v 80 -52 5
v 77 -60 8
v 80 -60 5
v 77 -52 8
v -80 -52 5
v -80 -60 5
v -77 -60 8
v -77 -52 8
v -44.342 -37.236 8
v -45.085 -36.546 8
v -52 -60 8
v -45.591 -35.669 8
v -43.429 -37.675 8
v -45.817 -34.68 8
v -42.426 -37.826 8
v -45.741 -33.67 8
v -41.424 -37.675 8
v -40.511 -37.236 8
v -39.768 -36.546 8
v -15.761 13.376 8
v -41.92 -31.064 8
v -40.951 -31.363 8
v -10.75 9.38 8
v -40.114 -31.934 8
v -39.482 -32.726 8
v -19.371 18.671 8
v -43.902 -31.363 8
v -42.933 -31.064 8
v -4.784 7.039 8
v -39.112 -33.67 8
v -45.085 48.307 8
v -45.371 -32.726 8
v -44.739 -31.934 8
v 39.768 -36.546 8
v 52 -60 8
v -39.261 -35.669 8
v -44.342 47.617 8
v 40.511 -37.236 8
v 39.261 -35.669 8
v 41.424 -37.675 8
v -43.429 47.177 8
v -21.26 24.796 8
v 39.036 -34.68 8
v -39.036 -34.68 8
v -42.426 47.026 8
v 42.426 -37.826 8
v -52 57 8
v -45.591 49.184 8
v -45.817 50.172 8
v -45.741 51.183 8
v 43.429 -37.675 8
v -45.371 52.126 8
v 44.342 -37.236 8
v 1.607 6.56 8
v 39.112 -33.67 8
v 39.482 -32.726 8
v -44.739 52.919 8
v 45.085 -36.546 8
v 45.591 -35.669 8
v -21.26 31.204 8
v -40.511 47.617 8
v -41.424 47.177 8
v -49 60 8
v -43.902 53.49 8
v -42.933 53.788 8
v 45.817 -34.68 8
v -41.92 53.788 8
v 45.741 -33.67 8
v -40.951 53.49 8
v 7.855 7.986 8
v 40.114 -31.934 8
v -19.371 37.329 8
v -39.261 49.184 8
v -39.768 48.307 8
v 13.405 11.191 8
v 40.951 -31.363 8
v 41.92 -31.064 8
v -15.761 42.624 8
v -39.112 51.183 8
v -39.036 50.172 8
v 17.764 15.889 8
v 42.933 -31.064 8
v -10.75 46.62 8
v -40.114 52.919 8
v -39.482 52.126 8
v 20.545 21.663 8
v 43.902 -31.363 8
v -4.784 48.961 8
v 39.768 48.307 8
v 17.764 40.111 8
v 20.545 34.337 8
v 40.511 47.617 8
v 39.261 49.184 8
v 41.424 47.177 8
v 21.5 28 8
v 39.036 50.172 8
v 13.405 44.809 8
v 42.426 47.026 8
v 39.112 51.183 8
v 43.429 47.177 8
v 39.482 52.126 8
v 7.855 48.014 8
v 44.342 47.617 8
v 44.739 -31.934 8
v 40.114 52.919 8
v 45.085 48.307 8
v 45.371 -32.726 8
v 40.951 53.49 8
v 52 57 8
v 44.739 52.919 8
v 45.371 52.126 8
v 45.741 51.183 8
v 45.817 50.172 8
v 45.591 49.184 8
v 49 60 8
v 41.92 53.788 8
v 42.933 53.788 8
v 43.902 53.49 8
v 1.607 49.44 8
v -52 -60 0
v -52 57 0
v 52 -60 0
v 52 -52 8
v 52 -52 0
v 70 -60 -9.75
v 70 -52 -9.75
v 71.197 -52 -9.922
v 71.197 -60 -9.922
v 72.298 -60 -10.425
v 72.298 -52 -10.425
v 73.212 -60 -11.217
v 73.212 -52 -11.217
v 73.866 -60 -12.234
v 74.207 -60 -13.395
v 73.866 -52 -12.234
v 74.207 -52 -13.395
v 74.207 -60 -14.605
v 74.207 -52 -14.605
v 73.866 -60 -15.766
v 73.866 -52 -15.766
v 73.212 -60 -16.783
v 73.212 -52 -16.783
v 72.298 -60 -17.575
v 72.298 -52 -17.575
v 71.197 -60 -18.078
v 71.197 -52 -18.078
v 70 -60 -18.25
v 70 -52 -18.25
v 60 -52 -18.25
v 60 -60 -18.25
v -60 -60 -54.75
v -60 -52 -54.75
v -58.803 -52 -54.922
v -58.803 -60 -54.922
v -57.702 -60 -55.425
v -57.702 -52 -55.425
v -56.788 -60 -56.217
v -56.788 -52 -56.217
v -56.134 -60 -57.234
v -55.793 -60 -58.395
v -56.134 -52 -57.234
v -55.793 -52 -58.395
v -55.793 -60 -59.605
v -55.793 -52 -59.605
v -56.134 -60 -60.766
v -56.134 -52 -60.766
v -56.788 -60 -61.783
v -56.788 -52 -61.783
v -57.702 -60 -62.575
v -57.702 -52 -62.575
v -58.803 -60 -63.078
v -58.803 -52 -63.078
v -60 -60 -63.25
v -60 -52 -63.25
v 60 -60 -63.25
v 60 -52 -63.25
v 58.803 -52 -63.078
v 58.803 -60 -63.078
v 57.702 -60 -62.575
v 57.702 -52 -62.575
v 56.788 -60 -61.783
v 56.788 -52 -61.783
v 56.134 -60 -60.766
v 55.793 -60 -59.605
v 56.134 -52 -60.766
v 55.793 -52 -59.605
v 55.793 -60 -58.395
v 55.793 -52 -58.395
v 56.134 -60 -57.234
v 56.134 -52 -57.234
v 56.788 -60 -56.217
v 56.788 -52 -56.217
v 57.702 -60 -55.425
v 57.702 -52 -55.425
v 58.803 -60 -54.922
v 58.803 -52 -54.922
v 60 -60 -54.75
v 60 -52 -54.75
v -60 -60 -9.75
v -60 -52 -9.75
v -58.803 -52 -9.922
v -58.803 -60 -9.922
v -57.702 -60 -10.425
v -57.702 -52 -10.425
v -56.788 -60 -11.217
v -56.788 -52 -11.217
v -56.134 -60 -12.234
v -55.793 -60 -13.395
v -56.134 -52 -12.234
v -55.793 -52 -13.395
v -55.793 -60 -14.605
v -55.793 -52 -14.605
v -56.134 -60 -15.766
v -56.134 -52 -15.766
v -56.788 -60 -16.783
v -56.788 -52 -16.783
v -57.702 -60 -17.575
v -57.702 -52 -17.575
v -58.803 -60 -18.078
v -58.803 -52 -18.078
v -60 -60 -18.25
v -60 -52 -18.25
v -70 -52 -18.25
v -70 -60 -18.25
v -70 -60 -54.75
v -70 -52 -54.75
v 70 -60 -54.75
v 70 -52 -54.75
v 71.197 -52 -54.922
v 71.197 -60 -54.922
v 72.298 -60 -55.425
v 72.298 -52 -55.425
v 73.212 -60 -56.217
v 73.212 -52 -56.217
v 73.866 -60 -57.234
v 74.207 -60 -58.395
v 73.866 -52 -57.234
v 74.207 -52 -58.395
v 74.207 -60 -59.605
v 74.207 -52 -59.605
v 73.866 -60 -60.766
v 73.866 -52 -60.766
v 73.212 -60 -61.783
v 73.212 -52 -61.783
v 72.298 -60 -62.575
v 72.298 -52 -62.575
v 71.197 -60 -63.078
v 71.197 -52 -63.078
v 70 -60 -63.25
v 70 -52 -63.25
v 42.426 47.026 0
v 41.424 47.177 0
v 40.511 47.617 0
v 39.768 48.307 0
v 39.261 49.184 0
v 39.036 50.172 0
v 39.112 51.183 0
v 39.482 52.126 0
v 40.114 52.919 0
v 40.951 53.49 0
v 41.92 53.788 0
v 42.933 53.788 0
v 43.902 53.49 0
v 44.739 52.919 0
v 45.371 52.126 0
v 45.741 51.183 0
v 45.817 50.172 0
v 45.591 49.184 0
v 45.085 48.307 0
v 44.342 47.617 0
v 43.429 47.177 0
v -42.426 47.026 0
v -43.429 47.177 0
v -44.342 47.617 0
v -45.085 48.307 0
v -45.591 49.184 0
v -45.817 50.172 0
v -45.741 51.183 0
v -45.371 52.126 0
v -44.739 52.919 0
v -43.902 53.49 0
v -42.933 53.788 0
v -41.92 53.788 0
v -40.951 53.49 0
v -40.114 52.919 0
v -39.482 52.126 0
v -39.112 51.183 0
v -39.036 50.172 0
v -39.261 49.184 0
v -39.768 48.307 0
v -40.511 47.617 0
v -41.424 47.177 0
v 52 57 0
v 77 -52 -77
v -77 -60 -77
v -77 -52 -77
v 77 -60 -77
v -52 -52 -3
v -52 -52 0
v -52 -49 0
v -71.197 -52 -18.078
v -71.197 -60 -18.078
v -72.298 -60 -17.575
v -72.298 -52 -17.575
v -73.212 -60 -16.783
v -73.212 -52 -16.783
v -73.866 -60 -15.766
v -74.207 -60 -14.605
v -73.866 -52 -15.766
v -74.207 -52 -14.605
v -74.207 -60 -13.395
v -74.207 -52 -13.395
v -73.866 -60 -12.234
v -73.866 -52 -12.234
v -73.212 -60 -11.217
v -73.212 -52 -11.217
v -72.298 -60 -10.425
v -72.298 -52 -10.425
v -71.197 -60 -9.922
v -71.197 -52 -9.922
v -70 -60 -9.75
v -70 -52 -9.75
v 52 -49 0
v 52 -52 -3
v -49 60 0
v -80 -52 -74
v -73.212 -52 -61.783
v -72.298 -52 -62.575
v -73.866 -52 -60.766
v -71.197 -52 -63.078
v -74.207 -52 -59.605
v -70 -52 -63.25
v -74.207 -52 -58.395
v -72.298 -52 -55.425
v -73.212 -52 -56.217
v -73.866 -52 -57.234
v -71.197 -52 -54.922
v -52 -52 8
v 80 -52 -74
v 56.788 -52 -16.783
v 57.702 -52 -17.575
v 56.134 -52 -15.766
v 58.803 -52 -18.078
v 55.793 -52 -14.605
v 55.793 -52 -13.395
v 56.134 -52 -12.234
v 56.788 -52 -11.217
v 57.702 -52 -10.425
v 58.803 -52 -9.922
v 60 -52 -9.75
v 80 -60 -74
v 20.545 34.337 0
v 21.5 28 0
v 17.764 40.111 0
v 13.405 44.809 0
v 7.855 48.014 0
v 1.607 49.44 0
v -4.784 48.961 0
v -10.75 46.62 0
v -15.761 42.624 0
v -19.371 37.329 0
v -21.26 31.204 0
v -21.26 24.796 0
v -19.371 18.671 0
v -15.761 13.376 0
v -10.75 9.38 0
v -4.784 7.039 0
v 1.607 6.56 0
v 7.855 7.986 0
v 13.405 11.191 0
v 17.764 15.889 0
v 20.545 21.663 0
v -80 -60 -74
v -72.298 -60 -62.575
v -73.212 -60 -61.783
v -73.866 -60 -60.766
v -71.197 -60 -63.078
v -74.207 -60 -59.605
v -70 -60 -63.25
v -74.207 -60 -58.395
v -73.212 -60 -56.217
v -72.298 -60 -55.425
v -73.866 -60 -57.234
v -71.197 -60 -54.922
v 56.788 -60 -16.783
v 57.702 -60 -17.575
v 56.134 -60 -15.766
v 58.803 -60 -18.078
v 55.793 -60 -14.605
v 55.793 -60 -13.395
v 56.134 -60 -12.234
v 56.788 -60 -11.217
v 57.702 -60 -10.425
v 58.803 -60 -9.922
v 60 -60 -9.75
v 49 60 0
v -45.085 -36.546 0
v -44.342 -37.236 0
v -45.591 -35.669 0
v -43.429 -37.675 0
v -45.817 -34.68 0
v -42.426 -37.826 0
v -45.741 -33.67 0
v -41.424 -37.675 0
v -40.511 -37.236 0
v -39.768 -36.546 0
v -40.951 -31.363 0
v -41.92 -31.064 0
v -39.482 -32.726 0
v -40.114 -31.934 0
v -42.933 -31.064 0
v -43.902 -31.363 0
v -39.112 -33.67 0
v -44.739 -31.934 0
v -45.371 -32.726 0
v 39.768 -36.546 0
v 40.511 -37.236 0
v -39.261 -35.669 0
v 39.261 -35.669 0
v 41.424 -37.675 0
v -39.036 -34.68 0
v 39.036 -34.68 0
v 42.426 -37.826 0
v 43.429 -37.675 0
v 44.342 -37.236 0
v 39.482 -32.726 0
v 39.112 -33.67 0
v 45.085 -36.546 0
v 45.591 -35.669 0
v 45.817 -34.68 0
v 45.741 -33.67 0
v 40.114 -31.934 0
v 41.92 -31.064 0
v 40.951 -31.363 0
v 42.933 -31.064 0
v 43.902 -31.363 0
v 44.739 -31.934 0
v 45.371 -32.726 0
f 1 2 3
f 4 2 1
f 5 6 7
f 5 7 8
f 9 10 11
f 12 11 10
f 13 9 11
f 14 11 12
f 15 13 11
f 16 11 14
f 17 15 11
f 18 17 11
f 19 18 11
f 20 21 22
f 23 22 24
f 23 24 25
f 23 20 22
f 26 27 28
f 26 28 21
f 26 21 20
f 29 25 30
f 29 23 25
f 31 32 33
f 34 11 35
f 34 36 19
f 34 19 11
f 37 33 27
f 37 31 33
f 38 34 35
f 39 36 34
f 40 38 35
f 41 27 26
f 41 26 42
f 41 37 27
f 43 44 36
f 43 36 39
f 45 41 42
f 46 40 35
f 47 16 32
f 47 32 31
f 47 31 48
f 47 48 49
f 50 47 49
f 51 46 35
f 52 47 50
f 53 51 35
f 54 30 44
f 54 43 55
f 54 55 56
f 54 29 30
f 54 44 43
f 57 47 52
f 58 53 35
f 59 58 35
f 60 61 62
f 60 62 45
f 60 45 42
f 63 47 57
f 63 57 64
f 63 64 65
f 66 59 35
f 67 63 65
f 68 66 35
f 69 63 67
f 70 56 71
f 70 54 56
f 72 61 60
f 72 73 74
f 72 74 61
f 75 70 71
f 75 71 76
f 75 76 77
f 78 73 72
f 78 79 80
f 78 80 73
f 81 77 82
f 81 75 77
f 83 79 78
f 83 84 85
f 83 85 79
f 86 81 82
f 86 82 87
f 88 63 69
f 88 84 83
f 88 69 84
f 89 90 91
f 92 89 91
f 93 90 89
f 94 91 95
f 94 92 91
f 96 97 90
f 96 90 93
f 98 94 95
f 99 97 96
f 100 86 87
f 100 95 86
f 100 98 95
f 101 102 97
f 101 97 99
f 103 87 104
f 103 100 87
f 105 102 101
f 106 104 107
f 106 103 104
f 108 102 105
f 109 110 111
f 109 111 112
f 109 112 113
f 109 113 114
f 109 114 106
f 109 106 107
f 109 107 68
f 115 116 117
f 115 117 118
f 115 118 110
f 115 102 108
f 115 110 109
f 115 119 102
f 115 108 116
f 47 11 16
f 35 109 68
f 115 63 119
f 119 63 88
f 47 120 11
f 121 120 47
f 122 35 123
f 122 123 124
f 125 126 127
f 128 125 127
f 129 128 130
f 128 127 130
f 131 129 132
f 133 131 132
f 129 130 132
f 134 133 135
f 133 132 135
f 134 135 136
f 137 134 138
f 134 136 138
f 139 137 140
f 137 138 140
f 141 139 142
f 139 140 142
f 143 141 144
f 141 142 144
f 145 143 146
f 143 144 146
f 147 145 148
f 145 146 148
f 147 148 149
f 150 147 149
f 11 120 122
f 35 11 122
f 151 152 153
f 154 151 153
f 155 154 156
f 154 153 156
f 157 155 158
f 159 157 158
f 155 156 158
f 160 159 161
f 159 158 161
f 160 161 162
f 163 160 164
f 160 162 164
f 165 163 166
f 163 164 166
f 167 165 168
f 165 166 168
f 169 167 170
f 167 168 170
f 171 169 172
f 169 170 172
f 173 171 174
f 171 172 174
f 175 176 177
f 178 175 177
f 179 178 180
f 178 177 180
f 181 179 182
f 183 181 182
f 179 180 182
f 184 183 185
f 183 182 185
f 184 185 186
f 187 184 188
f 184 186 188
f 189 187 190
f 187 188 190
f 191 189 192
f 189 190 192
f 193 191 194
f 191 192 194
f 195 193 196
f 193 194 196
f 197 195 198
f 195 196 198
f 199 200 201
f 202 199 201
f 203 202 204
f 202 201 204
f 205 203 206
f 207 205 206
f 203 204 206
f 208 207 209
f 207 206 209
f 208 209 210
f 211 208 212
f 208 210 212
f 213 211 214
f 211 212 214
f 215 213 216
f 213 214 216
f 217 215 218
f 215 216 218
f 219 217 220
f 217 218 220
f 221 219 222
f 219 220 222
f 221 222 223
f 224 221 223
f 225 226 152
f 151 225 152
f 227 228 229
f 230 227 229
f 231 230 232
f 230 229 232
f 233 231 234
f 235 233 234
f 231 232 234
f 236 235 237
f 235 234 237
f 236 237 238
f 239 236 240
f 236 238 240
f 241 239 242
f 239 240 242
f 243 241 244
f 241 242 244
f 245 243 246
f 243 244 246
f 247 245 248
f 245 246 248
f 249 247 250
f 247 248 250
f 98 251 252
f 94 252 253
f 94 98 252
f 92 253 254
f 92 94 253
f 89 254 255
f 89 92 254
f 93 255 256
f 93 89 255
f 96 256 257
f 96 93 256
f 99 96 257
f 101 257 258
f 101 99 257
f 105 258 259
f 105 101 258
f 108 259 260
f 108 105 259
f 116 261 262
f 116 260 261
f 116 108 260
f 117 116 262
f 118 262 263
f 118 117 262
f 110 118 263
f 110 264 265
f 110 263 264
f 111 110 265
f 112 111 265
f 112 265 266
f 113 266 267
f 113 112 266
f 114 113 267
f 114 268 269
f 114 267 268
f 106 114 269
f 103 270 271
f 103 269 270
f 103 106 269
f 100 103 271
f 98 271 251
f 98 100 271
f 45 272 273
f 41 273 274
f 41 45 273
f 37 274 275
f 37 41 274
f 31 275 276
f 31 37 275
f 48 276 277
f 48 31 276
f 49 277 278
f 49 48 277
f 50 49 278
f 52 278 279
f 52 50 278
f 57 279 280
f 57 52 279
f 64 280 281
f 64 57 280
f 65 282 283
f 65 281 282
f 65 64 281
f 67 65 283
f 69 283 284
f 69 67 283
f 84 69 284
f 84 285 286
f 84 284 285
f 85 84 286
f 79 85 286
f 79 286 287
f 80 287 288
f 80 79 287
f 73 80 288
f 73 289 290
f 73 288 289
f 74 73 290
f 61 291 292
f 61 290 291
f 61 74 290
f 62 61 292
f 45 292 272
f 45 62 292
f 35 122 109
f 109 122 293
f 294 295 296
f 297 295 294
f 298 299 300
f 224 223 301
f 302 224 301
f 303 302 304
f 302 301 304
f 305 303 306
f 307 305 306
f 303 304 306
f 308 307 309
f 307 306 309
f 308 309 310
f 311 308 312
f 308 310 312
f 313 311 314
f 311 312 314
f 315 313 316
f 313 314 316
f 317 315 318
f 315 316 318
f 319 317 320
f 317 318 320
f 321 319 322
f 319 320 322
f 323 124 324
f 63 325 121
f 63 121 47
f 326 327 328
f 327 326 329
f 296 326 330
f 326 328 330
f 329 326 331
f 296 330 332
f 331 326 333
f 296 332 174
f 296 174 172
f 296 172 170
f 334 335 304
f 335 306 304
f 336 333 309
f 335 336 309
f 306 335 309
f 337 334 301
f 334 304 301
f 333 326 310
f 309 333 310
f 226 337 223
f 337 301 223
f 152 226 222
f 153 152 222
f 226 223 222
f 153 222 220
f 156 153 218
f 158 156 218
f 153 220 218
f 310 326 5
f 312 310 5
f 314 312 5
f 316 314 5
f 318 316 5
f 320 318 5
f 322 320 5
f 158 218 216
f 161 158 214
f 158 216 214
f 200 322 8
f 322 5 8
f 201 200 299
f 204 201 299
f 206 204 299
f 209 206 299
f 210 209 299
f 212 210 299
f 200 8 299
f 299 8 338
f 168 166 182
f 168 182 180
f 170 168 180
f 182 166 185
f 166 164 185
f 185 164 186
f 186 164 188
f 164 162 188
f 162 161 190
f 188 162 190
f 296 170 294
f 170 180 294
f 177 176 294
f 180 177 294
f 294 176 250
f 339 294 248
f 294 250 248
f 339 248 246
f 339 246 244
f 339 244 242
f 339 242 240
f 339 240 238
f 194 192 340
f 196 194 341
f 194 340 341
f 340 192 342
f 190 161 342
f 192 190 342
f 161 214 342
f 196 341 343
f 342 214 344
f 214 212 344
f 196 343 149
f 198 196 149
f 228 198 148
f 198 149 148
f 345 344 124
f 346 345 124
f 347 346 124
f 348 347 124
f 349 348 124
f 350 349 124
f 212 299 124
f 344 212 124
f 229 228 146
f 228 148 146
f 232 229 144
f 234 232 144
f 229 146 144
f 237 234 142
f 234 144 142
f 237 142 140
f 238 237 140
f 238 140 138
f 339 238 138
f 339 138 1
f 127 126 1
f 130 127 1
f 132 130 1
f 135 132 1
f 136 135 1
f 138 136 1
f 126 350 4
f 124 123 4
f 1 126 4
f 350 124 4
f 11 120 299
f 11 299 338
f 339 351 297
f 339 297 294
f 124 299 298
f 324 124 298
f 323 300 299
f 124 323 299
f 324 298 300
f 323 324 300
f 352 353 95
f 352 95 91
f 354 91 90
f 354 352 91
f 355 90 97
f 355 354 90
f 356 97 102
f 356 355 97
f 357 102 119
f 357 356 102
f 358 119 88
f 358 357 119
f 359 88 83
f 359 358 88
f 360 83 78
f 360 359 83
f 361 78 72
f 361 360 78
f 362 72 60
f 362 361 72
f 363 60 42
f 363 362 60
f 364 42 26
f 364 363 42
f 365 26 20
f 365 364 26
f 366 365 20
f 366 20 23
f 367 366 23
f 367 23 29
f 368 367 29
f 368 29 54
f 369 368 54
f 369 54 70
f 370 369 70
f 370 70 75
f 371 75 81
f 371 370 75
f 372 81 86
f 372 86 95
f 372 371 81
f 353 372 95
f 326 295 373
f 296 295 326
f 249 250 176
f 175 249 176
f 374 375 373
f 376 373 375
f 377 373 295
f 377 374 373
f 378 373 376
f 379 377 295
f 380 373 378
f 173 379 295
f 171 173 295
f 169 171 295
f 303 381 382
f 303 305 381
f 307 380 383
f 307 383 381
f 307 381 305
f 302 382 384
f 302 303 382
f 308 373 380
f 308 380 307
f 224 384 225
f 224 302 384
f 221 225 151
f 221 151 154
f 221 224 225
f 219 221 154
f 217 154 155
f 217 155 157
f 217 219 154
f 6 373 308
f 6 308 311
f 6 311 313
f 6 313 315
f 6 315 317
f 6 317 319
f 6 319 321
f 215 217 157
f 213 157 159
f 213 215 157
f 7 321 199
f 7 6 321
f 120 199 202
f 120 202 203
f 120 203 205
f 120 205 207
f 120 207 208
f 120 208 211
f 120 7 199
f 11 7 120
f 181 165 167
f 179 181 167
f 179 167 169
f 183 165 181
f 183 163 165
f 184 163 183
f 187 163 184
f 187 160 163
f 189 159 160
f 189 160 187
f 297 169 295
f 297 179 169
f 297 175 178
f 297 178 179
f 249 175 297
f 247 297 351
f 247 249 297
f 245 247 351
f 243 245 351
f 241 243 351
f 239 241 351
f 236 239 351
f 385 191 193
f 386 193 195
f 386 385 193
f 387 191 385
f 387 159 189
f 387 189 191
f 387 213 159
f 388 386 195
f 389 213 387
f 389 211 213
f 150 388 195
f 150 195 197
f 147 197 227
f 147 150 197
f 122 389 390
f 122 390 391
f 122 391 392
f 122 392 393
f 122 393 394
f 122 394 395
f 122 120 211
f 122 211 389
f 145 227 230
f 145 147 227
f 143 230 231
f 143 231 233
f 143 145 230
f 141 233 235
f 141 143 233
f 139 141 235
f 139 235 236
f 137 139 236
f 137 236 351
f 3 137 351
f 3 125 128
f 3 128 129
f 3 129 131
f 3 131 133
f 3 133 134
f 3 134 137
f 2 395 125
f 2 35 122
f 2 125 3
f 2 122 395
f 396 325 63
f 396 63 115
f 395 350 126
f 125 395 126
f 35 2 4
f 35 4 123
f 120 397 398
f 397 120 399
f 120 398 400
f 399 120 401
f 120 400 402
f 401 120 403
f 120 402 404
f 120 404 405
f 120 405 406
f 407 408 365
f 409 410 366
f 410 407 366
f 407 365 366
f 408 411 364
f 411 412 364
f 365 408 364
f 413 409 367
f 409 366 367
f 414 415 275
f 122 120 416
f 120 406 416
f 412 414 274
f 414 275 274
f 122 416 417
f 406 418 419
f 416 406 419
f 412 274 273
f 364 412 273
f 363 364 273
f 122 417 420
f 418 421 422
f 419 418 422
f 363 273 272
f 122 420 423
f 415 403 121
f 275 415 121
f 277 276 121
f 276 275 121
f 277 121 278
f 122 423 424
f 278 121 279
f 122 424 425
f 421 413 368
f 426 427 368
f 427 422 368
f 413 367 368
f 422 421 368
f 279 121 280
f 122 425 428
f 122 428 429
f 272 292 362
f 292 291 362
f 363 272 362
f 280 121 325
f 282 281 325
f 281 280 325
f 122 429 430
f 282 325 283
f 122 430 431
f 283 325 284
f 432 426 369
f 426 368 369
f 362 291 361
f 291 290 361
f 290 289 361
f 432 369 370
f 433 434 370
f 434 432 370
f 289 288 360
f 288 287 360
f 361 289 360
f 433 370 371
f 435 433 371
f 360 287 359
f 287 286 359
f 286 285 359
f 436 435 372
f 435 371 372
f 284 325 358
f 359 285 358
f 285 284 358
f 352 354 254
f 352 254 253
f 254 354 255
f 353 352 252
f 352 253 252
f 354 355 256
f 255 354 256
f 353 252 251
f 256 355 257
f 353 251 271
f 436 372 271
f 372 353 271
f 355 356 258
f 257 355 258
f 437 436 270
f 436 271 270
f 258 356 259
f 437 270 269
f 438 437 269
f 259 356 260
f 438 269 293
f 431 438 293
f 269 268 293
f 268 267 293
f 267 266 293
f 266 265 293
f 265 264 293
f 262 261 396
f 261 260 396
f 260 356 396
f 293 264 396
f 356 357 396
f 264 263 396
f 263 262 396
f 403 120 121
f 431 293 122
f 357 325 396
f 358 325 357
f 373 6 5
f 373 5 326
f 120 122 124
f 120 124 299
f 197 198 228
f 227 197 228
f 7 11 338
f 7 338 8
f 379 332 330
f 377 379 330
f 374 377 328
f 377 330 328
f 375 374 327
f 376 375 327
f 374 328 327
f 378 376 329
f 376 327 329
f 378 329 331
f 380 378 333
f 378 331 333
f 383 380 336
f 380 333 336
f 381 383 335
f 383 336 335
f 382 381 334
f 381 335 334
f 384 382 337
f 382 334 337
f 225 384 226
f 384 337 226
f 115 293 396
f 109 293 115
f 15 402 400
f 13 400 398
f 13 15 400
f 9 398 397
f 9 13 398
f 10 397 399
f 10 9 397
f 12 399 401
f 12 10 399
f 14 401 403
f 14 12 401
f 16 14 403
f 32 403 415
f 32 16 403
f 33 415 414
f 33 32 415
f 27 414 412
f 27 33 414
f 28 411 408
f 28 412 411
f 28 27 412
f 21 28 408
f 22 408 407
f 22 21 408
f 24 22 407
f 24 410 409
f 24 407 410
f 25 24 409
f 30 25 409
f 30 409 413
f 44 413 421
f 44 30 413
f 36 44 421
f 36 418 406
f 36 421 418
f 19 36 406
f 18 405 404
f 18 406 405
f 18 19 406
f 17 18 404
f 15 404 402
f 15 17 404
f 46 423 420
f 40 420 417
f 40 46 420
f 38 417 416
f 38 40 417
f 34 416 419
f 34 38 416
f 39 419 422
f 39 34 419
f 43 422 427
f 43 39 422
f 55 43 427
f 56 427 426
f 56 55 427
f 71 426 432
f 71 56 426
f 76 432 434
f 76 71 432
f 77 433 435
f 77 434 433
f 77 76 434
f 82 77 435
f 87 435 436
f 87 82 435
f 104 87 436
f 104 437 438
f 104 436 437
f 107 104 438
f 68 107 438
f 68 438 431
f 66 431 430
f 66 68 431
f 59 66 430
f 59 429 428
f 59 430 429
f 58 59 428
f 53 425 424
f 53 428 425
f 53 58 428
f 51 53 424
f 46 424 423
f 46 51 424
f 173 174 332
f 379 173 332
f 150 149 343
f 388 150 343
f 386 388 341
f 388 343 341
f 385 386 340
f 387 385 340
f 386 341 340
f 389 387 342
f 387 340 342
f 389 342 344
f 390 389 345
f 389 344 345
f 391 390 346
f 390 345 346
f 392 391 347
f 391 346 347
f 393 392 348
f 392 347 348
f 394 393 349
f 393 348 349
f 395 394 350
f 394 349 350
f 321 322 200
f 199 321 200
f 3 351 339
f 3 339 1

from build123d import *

# Parameters (mm, degrees)
SKETCH1_W                  = 104
SKETCH1_H                  = 120
SKETCH1_R                  = 21.5
BOSS_EXTRUDE1_DEPTH        = 8
BOSS_EXTRUDE2_DEPTH        = 8
FILLET_START               = -52
FILLET_BEAD1_DEPTH         = 104
M8_TAPPED_HOLE1_AT_2_COUNT = 2
M8_TAPPED_HOLE1_AT_2_PITCH = 84.852813742
M8_TAPPED_HOLE1_AT_3_COUNT = 2
M8_TAPPED_HOLE1_AT_3_PITCH = 120
M8_TAPPED_HOLE1_AT_4_COUNT = 2
M8_TAPPED_HOLE1_AT_4_PITCH = 84.852813742
CHAMFER1_SIZE              = 3
CHAMFER2_SIZE              = 3
CUT_EXTRUDE1_DEPTH         = 8


# Read off the part's stored shape, not the designer's step: Fillet Bead1
with BuildPart() as part:
    # Sketch1 → Boss-Extrude1 (new body)
    with BuildSketch(Plane.XY):
        Rectangle(SKETCH1_W, SKETCH1_H)
        with Locations((0, 28)):
            Circle(SKETCH1_R, mode=Mode.SUBTRACT)
    extrude(amount=BOSS_EXTRUDE1_DEPTH)

    # Sketch4 → M8 Tapped Hole1 (revolve, cut)
    with BuildSketch(Plane(origin=(-42.426406871, -34.426406871, 8), x_dir=(0, -1, 0), z_dir=(1, 0, 0))):
        Polygon((0, 0), (0, 21.792926105), (3.4, 19.75), (3.4, 0), align=None)
    m8_tapped_hole1 = revolve(axis=Axis((-42.426406871, -34.426406871, 14.35), (0, 0, -1)), mode=Mode.SUBTRACT)

    # M8 Tapped Hole1 at 2: M8 Tapped Hole1 ×2
    with Locations(*[(i * M8_TAPPED_HOLE1_AT_2_PITCH, 0, 0) for i in range(1, M8_TAPPED_HOLE1_AT_2_COUNT)]):
        add(m8_tapped_hole1, mode=Mode.SUBTRACT)

    # M8 Tapped Hole1 at 3: M8 Tapped Hole1 ×2
    with Locations(*[Vector(0.7071067811865486, 0.7071067811865465, 0) * (i * M8_TAPPED_HOLE1_AT_3_PITCH) for i in range(1, M8_TAPPED_HOLE1_AT_3_COUNT)]):
        add(m8_tapped_hole1, mode=Mode.SUBTRACT)

    # M8 Tapped Hole1 at 4: M8 Tapped Hole1 ×2
    with Locations(*[(0, i * M8_TAPPED_HOLE1_AT_4_PITCH, 0) for i in range(1, M8_TAPPED_HOLE1_AT_4_COUNT)]):
        add(m8_tapped_hole1, mode=Mode.SUBTRACT)

    # Chamfer1
    chamfer1_edges = [part.edges().sort_by_distance(p)[0] for p in [
        (-52, 60, 4),
        (52, 60, 4),
    ]]
    chamfer(chamfer1_edges, length=CHAMFER1_SIZE)


with BuildPart() as body_2:
    # Sketch2 → Boss-Extrude2 (new body)
    with BuildSketch(Plane.XZ.offset(60)):
        Polygon((-52, 0), (-52, 8), (-80, 8), (-80, -77), (80, -77), (80, 8), (52, 8), (52, 0), align=None)
    extrude(amount=-BOSS_EXTRUDE2_DEPTH)

    # Chamfer2
    chamfer2_edges = [body_2.edges().sort_by_distance(p)[0] for p in [
        (-80, -56, 8),
        (80, -56, 8),
        (80, -56, -77),
        (-80, -56, -77),
    ]]
    chamfer(chamfer2_edges, length=CHAMFER2_SIZE)

    # Sketch5 → Cut-Extrude1 (cut)
    with BuildSketch(Plane(origin=(0, -52, 0), x_dir=(1, 0, 0), z_dir=(0, 1, 0))):
        with BuildLine():
            Line((-70, 54.75), (-60, 54.75))
            ThreePointArc((-60, 54.75), (-55.75, 59), (-60, 63.25))
            Line((-60, 63.25), (-70, 63.25))
            ThreePointArc((-70, 63.25), (-74.25, 59), (-70, 54.75))
        make_face()
        with BuildLine():
            Line((-70, 9.75), (-60, 9.75))
            ThreePointArc((-60, 9.75), (-55.75, 14), (-60, 18.25))
            Line((-60, 18.25), (-70, 18.25))
            ThreePointArc((-70, 18.25), (-74.25, 14), (-70, 9.75))
        make_face()
        with BuildLine():
            Line((70, 18.25), (60, 18.25))
            ThreePointArc((60, 18.25), (55.75, 14), (60, 9.75))
            Line((60, 9.75), (70, 9.75))
            ThreePointArc((70, 9.75), (74.25, 14), (70, 18.25))
        make_face()
        with BuildLine():
            Line((70, 63.25), (60, 63.25))
            ThreePointArc((60, 63.25), (55.75, 59), (60, 54.75))
            Line((60, 54.75), (70, 54.75))
            ThreePointArc((70, 54.75), (74.25, 59), (70, 63.25))
        make_face()
    extrude(amount=-CUT_EXTRUDE1_DEPTH, mode=Mode.SUBTRACT)


with BuildPart() as body_3:
    # Fillet Bead1 outline → Fillet Bead1 (new body)
    with BuildSketch(Plane.YZ.offset(FILLET_START)):
        Polygon((-52, -3), (-49, 0), (-52, 0), align=None)
    extrude(amount=FILLET_BEAD1_DEPTH)


solid = Compound([part.part, body_2.part, body_3.part])
